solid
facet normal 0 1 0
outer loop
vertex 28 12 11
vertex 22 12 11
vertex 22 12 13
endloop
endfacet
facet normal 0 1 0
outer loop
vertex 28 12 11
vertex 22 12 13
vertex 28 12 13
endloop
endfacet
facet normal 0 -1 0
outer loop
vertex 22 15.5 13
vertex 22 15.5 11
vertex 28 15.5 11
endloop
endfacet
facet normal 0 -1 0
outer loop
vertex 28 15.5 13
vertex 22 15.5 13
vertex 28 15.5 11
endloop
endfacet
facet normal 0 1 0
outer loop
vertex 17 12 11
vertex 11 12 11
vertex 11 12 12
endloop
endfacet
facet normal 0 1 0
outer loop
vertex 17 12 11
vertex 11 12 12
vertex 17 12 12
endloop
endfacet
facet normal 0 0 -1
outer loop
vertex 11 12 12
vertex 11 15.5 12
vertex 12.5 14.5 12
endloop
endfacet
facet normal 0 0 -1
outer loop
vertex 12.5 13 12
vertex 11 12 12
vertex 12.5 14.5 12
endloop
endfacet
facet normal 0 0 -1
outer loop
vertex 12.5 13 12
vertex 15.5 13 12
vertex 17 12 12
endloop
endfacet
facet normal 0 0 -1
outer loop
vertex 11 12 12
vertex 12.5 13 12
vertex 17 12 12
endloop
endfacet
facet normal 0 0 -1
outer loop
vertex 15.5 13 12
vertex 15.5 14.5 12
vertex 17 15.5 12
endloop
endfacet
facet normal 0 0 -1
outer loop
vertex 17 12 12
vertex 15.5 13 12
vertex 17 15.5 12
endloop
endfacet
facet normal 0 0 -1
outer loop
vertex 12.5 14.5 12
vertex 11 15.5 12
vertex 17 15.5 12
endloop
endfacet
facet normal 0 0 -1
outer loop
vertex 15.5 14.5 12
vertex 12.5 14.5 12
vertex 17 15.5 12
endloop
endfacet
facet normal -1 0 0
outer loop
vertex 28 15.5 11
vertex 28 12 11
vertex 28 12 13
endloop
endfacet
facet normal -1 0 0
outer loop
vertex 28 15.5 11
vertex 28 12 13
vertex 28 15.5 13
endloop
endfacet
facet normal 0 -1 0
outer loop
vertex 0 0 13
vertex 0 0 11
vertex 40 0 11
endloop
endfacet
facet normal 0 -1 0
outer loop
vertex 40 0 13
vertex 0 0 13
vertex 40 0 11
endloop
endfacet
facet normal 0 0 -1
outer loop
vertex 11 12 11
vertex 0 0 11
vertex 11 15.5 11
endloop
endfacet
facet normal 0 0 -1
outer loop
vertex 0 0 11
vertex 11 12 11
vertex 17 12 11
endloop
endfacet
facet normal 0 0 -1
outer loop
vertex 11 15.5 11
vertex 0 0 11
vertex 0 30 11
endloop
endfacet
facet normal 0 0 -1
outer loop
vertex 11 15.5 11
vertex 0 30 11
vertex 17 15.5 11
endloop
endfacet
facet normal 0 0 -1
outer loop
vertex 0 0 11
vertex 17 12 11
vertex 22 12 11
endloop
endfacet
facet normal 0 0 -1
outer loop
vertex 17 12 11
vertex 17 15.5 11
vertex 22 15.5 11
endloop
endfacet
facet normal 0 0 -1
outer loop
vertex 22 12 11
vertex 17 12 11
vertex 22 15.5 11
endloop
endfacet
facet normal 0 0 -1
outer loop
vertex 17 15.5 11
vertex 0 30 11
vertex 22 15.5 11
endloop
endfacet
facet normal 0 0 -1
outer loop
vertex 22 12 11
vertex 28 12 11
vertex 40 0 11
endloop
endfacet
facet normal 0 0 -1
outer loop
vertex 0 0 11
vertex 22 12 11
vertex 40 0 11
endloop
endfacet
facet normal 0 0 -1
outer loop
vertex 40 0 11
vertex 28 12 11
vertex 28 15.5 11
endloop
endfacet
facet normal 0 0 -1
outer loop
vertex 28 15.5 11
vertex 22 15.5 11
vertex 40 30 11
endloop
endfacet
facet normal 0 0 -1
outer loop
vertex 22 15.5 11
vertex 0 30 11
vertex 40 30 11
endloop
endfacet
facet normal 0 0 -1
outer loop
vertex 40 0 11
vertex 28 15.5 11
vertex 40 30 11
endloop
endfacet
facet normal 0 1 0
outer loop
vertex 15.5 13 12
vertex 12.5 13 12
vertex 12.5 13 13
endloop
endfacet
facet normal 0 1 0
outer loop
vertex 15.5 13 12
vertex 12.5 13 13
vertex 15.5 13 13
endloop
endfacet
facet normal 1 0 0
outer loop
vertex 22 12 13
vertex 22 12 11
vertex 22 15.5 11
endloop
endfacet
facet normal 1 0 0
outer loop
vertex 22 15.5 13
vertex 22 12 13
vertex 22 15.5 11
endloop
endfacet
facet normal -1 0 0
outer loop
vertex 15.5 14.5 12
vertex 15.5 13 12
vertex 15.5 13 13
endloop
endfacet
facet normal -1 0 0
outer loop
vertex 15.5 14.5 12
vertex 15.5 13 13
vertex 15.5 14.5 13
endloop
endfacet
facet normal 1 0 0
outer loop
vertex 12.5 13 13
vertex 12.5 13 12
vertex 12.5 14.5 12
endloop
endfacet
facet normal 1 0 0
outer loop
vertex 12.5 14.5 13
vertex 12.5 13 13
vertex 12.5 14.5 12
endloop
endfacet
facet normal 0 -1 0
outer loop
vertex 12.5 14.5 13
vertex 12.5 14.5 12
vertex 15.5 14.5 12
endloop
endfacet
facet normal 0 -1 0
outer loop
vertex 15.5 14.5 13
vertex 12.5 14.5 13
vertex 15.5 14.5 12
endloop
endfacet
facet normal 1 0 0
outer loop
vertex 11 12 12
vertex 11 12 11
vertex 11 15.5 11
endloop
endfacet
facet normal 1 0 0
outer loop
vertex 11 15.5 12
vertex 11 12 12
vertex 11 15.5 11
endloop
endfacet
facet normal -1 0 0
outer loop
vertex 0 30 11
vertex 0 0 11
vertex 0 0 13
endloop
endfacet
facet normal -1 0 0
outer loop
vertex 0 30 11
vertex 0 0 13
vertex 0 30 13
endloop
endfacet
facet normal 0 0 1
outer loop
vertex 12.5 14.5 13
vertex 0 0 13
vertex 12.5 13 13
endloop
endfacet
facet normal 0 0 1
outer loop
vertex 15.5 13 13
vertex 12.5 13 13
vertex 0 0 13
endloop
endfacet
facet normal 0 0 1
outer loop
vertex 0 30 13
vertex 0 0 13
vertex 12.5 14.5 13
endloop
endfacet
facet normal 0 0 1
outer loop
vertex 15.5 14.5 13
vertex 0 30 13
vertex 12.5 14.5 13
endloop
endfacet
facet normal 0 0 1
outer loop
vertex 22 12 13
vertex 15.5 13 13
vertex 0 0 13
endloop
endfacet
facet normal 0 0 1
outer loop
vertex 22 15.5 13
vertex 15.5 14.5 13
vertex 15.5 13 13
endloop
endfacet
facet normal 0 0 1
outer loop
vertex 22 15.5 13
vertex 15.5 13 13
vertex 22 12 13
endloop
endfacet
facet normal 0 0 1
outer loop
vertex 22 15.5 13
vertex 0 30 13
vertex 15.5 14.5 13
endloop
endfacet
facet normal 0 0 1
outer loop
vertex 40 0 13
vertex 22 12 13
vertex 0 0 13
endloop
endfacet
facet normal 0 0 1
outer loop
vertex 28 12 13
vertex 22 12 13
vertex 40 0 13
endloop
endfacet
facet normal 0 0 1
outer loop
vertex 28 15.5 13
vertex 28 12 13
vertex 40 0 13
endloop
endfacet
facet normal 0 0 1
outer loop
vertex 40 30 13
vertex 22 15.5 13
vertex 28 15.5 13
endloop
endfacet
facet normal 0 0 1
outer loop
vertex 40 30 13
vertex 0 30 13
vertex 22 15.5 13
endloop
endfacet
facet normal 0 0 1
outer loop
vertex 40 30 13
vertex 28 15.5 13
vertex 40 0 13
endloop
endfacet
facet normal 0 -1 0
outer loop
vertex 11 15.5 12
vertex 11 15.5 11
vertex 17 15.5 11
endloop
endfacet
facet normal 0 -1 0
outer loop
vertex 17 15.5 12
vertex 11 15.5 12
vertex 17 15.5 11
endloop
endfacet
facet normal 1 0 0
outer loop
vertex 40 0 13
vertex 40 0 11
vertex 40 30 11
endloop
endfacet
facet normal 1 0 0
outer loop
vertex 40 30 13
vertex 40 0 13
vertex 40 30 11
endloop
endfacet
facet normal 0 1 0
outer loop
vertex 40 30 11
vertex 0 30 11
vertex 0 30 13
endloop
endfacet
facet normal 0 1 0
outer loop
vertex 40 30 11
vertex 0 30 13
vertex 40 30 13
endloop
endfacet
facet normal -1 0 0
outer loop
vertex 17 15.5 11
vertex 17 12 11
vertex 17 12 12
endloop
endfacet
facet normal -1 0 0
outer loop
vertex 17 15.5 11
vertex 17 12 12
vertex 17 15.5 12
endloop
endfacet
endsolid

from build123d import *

# Parameters (mm, degrees)
BOX018_W     = 6
BOX018_H     = 3.5
BOX018_DEPTH = 3
BOX010_W     = 8
BOX010_H     = 5.5
BOX010_DEPTH = 1
BOX011_W     = 3
BOX011_H     = 1.5
BOX011_DEPTH = 2
BOX009_W     = 6
BOX009_H     = 3.5
BOX009_DEPTH = 2
BOX004_W     = 40
BOX004_H     = 30
BOX004_DEPTH = 2


with BuildPart() as cube016:
    # Box018 → Box018 (new body)
    with BuildSketch(Plane(origin=(22, 12, 11), x_dir=(1, 0, 0), z_dir=(0, 0, 1))):
        with Locations((3, 1.75)):
            Rectangle(BOX018_W, BOX018_H)
    extrude(amount=BOX018_DEPTH)


with BuildPart() as cube008:
    # Box010 → Box010 (new body)
    with BuildSketch(Plane(origin=(10, 11, 10), x_dir=(1, 0, 0), z_dir=(0, 0, 1))):
        with Locations((4, 2.75)):
            Rectangle(BOX010_W, BOX010_H)
    extrude(amount=BOX010_DEPTH)


with BuildPart() as cube009:
    # Box011 → Box011 (new body)
    with BuildSketch(Plane(origin=(12.5, 13, 12), x_dir=(1, 0, 0), z_dir=(0, 0, 1))):
        with Locations((1.5, 0.75)):
            Rectangle(BOX011_W, BOX011_H)
    extrude(amount=BOX011_DEPTH)


with BuildPart() as fusion002:
    # Box009 → Box009 (new body)
    with BuildSketch(Plane(origin=(11, 12, 10), x_dir=(1, 0, 0), z_dir=(0, 0, 1))):
        with Locations((3, 1.75)):
            Rectangle(BOX009_W, BOX009_H)
    extrude(amount=BOX009_DEPTH)

    # Fusion002: union Cube008, Cube009
    add(cube008.part)
    add(cube009.part)


with BuildPart() as top:
    # Box004 → Box004 (new body)
    with BuildSketch(Plane.XY.offset(11)):
        with Locations((20, 15)):
            Rectangle(BOX004_W, BOX004_H)
    extrude(amount=BOX004_DEPTH)

    # Cut002: cut Fusion002
    add(fusion002.part, mode=Mode.SUBTRACT)

    # Cut005: cut Cube016
    add(cube016.part, mode=Mode.SUBTRACT)


solid = top.part
